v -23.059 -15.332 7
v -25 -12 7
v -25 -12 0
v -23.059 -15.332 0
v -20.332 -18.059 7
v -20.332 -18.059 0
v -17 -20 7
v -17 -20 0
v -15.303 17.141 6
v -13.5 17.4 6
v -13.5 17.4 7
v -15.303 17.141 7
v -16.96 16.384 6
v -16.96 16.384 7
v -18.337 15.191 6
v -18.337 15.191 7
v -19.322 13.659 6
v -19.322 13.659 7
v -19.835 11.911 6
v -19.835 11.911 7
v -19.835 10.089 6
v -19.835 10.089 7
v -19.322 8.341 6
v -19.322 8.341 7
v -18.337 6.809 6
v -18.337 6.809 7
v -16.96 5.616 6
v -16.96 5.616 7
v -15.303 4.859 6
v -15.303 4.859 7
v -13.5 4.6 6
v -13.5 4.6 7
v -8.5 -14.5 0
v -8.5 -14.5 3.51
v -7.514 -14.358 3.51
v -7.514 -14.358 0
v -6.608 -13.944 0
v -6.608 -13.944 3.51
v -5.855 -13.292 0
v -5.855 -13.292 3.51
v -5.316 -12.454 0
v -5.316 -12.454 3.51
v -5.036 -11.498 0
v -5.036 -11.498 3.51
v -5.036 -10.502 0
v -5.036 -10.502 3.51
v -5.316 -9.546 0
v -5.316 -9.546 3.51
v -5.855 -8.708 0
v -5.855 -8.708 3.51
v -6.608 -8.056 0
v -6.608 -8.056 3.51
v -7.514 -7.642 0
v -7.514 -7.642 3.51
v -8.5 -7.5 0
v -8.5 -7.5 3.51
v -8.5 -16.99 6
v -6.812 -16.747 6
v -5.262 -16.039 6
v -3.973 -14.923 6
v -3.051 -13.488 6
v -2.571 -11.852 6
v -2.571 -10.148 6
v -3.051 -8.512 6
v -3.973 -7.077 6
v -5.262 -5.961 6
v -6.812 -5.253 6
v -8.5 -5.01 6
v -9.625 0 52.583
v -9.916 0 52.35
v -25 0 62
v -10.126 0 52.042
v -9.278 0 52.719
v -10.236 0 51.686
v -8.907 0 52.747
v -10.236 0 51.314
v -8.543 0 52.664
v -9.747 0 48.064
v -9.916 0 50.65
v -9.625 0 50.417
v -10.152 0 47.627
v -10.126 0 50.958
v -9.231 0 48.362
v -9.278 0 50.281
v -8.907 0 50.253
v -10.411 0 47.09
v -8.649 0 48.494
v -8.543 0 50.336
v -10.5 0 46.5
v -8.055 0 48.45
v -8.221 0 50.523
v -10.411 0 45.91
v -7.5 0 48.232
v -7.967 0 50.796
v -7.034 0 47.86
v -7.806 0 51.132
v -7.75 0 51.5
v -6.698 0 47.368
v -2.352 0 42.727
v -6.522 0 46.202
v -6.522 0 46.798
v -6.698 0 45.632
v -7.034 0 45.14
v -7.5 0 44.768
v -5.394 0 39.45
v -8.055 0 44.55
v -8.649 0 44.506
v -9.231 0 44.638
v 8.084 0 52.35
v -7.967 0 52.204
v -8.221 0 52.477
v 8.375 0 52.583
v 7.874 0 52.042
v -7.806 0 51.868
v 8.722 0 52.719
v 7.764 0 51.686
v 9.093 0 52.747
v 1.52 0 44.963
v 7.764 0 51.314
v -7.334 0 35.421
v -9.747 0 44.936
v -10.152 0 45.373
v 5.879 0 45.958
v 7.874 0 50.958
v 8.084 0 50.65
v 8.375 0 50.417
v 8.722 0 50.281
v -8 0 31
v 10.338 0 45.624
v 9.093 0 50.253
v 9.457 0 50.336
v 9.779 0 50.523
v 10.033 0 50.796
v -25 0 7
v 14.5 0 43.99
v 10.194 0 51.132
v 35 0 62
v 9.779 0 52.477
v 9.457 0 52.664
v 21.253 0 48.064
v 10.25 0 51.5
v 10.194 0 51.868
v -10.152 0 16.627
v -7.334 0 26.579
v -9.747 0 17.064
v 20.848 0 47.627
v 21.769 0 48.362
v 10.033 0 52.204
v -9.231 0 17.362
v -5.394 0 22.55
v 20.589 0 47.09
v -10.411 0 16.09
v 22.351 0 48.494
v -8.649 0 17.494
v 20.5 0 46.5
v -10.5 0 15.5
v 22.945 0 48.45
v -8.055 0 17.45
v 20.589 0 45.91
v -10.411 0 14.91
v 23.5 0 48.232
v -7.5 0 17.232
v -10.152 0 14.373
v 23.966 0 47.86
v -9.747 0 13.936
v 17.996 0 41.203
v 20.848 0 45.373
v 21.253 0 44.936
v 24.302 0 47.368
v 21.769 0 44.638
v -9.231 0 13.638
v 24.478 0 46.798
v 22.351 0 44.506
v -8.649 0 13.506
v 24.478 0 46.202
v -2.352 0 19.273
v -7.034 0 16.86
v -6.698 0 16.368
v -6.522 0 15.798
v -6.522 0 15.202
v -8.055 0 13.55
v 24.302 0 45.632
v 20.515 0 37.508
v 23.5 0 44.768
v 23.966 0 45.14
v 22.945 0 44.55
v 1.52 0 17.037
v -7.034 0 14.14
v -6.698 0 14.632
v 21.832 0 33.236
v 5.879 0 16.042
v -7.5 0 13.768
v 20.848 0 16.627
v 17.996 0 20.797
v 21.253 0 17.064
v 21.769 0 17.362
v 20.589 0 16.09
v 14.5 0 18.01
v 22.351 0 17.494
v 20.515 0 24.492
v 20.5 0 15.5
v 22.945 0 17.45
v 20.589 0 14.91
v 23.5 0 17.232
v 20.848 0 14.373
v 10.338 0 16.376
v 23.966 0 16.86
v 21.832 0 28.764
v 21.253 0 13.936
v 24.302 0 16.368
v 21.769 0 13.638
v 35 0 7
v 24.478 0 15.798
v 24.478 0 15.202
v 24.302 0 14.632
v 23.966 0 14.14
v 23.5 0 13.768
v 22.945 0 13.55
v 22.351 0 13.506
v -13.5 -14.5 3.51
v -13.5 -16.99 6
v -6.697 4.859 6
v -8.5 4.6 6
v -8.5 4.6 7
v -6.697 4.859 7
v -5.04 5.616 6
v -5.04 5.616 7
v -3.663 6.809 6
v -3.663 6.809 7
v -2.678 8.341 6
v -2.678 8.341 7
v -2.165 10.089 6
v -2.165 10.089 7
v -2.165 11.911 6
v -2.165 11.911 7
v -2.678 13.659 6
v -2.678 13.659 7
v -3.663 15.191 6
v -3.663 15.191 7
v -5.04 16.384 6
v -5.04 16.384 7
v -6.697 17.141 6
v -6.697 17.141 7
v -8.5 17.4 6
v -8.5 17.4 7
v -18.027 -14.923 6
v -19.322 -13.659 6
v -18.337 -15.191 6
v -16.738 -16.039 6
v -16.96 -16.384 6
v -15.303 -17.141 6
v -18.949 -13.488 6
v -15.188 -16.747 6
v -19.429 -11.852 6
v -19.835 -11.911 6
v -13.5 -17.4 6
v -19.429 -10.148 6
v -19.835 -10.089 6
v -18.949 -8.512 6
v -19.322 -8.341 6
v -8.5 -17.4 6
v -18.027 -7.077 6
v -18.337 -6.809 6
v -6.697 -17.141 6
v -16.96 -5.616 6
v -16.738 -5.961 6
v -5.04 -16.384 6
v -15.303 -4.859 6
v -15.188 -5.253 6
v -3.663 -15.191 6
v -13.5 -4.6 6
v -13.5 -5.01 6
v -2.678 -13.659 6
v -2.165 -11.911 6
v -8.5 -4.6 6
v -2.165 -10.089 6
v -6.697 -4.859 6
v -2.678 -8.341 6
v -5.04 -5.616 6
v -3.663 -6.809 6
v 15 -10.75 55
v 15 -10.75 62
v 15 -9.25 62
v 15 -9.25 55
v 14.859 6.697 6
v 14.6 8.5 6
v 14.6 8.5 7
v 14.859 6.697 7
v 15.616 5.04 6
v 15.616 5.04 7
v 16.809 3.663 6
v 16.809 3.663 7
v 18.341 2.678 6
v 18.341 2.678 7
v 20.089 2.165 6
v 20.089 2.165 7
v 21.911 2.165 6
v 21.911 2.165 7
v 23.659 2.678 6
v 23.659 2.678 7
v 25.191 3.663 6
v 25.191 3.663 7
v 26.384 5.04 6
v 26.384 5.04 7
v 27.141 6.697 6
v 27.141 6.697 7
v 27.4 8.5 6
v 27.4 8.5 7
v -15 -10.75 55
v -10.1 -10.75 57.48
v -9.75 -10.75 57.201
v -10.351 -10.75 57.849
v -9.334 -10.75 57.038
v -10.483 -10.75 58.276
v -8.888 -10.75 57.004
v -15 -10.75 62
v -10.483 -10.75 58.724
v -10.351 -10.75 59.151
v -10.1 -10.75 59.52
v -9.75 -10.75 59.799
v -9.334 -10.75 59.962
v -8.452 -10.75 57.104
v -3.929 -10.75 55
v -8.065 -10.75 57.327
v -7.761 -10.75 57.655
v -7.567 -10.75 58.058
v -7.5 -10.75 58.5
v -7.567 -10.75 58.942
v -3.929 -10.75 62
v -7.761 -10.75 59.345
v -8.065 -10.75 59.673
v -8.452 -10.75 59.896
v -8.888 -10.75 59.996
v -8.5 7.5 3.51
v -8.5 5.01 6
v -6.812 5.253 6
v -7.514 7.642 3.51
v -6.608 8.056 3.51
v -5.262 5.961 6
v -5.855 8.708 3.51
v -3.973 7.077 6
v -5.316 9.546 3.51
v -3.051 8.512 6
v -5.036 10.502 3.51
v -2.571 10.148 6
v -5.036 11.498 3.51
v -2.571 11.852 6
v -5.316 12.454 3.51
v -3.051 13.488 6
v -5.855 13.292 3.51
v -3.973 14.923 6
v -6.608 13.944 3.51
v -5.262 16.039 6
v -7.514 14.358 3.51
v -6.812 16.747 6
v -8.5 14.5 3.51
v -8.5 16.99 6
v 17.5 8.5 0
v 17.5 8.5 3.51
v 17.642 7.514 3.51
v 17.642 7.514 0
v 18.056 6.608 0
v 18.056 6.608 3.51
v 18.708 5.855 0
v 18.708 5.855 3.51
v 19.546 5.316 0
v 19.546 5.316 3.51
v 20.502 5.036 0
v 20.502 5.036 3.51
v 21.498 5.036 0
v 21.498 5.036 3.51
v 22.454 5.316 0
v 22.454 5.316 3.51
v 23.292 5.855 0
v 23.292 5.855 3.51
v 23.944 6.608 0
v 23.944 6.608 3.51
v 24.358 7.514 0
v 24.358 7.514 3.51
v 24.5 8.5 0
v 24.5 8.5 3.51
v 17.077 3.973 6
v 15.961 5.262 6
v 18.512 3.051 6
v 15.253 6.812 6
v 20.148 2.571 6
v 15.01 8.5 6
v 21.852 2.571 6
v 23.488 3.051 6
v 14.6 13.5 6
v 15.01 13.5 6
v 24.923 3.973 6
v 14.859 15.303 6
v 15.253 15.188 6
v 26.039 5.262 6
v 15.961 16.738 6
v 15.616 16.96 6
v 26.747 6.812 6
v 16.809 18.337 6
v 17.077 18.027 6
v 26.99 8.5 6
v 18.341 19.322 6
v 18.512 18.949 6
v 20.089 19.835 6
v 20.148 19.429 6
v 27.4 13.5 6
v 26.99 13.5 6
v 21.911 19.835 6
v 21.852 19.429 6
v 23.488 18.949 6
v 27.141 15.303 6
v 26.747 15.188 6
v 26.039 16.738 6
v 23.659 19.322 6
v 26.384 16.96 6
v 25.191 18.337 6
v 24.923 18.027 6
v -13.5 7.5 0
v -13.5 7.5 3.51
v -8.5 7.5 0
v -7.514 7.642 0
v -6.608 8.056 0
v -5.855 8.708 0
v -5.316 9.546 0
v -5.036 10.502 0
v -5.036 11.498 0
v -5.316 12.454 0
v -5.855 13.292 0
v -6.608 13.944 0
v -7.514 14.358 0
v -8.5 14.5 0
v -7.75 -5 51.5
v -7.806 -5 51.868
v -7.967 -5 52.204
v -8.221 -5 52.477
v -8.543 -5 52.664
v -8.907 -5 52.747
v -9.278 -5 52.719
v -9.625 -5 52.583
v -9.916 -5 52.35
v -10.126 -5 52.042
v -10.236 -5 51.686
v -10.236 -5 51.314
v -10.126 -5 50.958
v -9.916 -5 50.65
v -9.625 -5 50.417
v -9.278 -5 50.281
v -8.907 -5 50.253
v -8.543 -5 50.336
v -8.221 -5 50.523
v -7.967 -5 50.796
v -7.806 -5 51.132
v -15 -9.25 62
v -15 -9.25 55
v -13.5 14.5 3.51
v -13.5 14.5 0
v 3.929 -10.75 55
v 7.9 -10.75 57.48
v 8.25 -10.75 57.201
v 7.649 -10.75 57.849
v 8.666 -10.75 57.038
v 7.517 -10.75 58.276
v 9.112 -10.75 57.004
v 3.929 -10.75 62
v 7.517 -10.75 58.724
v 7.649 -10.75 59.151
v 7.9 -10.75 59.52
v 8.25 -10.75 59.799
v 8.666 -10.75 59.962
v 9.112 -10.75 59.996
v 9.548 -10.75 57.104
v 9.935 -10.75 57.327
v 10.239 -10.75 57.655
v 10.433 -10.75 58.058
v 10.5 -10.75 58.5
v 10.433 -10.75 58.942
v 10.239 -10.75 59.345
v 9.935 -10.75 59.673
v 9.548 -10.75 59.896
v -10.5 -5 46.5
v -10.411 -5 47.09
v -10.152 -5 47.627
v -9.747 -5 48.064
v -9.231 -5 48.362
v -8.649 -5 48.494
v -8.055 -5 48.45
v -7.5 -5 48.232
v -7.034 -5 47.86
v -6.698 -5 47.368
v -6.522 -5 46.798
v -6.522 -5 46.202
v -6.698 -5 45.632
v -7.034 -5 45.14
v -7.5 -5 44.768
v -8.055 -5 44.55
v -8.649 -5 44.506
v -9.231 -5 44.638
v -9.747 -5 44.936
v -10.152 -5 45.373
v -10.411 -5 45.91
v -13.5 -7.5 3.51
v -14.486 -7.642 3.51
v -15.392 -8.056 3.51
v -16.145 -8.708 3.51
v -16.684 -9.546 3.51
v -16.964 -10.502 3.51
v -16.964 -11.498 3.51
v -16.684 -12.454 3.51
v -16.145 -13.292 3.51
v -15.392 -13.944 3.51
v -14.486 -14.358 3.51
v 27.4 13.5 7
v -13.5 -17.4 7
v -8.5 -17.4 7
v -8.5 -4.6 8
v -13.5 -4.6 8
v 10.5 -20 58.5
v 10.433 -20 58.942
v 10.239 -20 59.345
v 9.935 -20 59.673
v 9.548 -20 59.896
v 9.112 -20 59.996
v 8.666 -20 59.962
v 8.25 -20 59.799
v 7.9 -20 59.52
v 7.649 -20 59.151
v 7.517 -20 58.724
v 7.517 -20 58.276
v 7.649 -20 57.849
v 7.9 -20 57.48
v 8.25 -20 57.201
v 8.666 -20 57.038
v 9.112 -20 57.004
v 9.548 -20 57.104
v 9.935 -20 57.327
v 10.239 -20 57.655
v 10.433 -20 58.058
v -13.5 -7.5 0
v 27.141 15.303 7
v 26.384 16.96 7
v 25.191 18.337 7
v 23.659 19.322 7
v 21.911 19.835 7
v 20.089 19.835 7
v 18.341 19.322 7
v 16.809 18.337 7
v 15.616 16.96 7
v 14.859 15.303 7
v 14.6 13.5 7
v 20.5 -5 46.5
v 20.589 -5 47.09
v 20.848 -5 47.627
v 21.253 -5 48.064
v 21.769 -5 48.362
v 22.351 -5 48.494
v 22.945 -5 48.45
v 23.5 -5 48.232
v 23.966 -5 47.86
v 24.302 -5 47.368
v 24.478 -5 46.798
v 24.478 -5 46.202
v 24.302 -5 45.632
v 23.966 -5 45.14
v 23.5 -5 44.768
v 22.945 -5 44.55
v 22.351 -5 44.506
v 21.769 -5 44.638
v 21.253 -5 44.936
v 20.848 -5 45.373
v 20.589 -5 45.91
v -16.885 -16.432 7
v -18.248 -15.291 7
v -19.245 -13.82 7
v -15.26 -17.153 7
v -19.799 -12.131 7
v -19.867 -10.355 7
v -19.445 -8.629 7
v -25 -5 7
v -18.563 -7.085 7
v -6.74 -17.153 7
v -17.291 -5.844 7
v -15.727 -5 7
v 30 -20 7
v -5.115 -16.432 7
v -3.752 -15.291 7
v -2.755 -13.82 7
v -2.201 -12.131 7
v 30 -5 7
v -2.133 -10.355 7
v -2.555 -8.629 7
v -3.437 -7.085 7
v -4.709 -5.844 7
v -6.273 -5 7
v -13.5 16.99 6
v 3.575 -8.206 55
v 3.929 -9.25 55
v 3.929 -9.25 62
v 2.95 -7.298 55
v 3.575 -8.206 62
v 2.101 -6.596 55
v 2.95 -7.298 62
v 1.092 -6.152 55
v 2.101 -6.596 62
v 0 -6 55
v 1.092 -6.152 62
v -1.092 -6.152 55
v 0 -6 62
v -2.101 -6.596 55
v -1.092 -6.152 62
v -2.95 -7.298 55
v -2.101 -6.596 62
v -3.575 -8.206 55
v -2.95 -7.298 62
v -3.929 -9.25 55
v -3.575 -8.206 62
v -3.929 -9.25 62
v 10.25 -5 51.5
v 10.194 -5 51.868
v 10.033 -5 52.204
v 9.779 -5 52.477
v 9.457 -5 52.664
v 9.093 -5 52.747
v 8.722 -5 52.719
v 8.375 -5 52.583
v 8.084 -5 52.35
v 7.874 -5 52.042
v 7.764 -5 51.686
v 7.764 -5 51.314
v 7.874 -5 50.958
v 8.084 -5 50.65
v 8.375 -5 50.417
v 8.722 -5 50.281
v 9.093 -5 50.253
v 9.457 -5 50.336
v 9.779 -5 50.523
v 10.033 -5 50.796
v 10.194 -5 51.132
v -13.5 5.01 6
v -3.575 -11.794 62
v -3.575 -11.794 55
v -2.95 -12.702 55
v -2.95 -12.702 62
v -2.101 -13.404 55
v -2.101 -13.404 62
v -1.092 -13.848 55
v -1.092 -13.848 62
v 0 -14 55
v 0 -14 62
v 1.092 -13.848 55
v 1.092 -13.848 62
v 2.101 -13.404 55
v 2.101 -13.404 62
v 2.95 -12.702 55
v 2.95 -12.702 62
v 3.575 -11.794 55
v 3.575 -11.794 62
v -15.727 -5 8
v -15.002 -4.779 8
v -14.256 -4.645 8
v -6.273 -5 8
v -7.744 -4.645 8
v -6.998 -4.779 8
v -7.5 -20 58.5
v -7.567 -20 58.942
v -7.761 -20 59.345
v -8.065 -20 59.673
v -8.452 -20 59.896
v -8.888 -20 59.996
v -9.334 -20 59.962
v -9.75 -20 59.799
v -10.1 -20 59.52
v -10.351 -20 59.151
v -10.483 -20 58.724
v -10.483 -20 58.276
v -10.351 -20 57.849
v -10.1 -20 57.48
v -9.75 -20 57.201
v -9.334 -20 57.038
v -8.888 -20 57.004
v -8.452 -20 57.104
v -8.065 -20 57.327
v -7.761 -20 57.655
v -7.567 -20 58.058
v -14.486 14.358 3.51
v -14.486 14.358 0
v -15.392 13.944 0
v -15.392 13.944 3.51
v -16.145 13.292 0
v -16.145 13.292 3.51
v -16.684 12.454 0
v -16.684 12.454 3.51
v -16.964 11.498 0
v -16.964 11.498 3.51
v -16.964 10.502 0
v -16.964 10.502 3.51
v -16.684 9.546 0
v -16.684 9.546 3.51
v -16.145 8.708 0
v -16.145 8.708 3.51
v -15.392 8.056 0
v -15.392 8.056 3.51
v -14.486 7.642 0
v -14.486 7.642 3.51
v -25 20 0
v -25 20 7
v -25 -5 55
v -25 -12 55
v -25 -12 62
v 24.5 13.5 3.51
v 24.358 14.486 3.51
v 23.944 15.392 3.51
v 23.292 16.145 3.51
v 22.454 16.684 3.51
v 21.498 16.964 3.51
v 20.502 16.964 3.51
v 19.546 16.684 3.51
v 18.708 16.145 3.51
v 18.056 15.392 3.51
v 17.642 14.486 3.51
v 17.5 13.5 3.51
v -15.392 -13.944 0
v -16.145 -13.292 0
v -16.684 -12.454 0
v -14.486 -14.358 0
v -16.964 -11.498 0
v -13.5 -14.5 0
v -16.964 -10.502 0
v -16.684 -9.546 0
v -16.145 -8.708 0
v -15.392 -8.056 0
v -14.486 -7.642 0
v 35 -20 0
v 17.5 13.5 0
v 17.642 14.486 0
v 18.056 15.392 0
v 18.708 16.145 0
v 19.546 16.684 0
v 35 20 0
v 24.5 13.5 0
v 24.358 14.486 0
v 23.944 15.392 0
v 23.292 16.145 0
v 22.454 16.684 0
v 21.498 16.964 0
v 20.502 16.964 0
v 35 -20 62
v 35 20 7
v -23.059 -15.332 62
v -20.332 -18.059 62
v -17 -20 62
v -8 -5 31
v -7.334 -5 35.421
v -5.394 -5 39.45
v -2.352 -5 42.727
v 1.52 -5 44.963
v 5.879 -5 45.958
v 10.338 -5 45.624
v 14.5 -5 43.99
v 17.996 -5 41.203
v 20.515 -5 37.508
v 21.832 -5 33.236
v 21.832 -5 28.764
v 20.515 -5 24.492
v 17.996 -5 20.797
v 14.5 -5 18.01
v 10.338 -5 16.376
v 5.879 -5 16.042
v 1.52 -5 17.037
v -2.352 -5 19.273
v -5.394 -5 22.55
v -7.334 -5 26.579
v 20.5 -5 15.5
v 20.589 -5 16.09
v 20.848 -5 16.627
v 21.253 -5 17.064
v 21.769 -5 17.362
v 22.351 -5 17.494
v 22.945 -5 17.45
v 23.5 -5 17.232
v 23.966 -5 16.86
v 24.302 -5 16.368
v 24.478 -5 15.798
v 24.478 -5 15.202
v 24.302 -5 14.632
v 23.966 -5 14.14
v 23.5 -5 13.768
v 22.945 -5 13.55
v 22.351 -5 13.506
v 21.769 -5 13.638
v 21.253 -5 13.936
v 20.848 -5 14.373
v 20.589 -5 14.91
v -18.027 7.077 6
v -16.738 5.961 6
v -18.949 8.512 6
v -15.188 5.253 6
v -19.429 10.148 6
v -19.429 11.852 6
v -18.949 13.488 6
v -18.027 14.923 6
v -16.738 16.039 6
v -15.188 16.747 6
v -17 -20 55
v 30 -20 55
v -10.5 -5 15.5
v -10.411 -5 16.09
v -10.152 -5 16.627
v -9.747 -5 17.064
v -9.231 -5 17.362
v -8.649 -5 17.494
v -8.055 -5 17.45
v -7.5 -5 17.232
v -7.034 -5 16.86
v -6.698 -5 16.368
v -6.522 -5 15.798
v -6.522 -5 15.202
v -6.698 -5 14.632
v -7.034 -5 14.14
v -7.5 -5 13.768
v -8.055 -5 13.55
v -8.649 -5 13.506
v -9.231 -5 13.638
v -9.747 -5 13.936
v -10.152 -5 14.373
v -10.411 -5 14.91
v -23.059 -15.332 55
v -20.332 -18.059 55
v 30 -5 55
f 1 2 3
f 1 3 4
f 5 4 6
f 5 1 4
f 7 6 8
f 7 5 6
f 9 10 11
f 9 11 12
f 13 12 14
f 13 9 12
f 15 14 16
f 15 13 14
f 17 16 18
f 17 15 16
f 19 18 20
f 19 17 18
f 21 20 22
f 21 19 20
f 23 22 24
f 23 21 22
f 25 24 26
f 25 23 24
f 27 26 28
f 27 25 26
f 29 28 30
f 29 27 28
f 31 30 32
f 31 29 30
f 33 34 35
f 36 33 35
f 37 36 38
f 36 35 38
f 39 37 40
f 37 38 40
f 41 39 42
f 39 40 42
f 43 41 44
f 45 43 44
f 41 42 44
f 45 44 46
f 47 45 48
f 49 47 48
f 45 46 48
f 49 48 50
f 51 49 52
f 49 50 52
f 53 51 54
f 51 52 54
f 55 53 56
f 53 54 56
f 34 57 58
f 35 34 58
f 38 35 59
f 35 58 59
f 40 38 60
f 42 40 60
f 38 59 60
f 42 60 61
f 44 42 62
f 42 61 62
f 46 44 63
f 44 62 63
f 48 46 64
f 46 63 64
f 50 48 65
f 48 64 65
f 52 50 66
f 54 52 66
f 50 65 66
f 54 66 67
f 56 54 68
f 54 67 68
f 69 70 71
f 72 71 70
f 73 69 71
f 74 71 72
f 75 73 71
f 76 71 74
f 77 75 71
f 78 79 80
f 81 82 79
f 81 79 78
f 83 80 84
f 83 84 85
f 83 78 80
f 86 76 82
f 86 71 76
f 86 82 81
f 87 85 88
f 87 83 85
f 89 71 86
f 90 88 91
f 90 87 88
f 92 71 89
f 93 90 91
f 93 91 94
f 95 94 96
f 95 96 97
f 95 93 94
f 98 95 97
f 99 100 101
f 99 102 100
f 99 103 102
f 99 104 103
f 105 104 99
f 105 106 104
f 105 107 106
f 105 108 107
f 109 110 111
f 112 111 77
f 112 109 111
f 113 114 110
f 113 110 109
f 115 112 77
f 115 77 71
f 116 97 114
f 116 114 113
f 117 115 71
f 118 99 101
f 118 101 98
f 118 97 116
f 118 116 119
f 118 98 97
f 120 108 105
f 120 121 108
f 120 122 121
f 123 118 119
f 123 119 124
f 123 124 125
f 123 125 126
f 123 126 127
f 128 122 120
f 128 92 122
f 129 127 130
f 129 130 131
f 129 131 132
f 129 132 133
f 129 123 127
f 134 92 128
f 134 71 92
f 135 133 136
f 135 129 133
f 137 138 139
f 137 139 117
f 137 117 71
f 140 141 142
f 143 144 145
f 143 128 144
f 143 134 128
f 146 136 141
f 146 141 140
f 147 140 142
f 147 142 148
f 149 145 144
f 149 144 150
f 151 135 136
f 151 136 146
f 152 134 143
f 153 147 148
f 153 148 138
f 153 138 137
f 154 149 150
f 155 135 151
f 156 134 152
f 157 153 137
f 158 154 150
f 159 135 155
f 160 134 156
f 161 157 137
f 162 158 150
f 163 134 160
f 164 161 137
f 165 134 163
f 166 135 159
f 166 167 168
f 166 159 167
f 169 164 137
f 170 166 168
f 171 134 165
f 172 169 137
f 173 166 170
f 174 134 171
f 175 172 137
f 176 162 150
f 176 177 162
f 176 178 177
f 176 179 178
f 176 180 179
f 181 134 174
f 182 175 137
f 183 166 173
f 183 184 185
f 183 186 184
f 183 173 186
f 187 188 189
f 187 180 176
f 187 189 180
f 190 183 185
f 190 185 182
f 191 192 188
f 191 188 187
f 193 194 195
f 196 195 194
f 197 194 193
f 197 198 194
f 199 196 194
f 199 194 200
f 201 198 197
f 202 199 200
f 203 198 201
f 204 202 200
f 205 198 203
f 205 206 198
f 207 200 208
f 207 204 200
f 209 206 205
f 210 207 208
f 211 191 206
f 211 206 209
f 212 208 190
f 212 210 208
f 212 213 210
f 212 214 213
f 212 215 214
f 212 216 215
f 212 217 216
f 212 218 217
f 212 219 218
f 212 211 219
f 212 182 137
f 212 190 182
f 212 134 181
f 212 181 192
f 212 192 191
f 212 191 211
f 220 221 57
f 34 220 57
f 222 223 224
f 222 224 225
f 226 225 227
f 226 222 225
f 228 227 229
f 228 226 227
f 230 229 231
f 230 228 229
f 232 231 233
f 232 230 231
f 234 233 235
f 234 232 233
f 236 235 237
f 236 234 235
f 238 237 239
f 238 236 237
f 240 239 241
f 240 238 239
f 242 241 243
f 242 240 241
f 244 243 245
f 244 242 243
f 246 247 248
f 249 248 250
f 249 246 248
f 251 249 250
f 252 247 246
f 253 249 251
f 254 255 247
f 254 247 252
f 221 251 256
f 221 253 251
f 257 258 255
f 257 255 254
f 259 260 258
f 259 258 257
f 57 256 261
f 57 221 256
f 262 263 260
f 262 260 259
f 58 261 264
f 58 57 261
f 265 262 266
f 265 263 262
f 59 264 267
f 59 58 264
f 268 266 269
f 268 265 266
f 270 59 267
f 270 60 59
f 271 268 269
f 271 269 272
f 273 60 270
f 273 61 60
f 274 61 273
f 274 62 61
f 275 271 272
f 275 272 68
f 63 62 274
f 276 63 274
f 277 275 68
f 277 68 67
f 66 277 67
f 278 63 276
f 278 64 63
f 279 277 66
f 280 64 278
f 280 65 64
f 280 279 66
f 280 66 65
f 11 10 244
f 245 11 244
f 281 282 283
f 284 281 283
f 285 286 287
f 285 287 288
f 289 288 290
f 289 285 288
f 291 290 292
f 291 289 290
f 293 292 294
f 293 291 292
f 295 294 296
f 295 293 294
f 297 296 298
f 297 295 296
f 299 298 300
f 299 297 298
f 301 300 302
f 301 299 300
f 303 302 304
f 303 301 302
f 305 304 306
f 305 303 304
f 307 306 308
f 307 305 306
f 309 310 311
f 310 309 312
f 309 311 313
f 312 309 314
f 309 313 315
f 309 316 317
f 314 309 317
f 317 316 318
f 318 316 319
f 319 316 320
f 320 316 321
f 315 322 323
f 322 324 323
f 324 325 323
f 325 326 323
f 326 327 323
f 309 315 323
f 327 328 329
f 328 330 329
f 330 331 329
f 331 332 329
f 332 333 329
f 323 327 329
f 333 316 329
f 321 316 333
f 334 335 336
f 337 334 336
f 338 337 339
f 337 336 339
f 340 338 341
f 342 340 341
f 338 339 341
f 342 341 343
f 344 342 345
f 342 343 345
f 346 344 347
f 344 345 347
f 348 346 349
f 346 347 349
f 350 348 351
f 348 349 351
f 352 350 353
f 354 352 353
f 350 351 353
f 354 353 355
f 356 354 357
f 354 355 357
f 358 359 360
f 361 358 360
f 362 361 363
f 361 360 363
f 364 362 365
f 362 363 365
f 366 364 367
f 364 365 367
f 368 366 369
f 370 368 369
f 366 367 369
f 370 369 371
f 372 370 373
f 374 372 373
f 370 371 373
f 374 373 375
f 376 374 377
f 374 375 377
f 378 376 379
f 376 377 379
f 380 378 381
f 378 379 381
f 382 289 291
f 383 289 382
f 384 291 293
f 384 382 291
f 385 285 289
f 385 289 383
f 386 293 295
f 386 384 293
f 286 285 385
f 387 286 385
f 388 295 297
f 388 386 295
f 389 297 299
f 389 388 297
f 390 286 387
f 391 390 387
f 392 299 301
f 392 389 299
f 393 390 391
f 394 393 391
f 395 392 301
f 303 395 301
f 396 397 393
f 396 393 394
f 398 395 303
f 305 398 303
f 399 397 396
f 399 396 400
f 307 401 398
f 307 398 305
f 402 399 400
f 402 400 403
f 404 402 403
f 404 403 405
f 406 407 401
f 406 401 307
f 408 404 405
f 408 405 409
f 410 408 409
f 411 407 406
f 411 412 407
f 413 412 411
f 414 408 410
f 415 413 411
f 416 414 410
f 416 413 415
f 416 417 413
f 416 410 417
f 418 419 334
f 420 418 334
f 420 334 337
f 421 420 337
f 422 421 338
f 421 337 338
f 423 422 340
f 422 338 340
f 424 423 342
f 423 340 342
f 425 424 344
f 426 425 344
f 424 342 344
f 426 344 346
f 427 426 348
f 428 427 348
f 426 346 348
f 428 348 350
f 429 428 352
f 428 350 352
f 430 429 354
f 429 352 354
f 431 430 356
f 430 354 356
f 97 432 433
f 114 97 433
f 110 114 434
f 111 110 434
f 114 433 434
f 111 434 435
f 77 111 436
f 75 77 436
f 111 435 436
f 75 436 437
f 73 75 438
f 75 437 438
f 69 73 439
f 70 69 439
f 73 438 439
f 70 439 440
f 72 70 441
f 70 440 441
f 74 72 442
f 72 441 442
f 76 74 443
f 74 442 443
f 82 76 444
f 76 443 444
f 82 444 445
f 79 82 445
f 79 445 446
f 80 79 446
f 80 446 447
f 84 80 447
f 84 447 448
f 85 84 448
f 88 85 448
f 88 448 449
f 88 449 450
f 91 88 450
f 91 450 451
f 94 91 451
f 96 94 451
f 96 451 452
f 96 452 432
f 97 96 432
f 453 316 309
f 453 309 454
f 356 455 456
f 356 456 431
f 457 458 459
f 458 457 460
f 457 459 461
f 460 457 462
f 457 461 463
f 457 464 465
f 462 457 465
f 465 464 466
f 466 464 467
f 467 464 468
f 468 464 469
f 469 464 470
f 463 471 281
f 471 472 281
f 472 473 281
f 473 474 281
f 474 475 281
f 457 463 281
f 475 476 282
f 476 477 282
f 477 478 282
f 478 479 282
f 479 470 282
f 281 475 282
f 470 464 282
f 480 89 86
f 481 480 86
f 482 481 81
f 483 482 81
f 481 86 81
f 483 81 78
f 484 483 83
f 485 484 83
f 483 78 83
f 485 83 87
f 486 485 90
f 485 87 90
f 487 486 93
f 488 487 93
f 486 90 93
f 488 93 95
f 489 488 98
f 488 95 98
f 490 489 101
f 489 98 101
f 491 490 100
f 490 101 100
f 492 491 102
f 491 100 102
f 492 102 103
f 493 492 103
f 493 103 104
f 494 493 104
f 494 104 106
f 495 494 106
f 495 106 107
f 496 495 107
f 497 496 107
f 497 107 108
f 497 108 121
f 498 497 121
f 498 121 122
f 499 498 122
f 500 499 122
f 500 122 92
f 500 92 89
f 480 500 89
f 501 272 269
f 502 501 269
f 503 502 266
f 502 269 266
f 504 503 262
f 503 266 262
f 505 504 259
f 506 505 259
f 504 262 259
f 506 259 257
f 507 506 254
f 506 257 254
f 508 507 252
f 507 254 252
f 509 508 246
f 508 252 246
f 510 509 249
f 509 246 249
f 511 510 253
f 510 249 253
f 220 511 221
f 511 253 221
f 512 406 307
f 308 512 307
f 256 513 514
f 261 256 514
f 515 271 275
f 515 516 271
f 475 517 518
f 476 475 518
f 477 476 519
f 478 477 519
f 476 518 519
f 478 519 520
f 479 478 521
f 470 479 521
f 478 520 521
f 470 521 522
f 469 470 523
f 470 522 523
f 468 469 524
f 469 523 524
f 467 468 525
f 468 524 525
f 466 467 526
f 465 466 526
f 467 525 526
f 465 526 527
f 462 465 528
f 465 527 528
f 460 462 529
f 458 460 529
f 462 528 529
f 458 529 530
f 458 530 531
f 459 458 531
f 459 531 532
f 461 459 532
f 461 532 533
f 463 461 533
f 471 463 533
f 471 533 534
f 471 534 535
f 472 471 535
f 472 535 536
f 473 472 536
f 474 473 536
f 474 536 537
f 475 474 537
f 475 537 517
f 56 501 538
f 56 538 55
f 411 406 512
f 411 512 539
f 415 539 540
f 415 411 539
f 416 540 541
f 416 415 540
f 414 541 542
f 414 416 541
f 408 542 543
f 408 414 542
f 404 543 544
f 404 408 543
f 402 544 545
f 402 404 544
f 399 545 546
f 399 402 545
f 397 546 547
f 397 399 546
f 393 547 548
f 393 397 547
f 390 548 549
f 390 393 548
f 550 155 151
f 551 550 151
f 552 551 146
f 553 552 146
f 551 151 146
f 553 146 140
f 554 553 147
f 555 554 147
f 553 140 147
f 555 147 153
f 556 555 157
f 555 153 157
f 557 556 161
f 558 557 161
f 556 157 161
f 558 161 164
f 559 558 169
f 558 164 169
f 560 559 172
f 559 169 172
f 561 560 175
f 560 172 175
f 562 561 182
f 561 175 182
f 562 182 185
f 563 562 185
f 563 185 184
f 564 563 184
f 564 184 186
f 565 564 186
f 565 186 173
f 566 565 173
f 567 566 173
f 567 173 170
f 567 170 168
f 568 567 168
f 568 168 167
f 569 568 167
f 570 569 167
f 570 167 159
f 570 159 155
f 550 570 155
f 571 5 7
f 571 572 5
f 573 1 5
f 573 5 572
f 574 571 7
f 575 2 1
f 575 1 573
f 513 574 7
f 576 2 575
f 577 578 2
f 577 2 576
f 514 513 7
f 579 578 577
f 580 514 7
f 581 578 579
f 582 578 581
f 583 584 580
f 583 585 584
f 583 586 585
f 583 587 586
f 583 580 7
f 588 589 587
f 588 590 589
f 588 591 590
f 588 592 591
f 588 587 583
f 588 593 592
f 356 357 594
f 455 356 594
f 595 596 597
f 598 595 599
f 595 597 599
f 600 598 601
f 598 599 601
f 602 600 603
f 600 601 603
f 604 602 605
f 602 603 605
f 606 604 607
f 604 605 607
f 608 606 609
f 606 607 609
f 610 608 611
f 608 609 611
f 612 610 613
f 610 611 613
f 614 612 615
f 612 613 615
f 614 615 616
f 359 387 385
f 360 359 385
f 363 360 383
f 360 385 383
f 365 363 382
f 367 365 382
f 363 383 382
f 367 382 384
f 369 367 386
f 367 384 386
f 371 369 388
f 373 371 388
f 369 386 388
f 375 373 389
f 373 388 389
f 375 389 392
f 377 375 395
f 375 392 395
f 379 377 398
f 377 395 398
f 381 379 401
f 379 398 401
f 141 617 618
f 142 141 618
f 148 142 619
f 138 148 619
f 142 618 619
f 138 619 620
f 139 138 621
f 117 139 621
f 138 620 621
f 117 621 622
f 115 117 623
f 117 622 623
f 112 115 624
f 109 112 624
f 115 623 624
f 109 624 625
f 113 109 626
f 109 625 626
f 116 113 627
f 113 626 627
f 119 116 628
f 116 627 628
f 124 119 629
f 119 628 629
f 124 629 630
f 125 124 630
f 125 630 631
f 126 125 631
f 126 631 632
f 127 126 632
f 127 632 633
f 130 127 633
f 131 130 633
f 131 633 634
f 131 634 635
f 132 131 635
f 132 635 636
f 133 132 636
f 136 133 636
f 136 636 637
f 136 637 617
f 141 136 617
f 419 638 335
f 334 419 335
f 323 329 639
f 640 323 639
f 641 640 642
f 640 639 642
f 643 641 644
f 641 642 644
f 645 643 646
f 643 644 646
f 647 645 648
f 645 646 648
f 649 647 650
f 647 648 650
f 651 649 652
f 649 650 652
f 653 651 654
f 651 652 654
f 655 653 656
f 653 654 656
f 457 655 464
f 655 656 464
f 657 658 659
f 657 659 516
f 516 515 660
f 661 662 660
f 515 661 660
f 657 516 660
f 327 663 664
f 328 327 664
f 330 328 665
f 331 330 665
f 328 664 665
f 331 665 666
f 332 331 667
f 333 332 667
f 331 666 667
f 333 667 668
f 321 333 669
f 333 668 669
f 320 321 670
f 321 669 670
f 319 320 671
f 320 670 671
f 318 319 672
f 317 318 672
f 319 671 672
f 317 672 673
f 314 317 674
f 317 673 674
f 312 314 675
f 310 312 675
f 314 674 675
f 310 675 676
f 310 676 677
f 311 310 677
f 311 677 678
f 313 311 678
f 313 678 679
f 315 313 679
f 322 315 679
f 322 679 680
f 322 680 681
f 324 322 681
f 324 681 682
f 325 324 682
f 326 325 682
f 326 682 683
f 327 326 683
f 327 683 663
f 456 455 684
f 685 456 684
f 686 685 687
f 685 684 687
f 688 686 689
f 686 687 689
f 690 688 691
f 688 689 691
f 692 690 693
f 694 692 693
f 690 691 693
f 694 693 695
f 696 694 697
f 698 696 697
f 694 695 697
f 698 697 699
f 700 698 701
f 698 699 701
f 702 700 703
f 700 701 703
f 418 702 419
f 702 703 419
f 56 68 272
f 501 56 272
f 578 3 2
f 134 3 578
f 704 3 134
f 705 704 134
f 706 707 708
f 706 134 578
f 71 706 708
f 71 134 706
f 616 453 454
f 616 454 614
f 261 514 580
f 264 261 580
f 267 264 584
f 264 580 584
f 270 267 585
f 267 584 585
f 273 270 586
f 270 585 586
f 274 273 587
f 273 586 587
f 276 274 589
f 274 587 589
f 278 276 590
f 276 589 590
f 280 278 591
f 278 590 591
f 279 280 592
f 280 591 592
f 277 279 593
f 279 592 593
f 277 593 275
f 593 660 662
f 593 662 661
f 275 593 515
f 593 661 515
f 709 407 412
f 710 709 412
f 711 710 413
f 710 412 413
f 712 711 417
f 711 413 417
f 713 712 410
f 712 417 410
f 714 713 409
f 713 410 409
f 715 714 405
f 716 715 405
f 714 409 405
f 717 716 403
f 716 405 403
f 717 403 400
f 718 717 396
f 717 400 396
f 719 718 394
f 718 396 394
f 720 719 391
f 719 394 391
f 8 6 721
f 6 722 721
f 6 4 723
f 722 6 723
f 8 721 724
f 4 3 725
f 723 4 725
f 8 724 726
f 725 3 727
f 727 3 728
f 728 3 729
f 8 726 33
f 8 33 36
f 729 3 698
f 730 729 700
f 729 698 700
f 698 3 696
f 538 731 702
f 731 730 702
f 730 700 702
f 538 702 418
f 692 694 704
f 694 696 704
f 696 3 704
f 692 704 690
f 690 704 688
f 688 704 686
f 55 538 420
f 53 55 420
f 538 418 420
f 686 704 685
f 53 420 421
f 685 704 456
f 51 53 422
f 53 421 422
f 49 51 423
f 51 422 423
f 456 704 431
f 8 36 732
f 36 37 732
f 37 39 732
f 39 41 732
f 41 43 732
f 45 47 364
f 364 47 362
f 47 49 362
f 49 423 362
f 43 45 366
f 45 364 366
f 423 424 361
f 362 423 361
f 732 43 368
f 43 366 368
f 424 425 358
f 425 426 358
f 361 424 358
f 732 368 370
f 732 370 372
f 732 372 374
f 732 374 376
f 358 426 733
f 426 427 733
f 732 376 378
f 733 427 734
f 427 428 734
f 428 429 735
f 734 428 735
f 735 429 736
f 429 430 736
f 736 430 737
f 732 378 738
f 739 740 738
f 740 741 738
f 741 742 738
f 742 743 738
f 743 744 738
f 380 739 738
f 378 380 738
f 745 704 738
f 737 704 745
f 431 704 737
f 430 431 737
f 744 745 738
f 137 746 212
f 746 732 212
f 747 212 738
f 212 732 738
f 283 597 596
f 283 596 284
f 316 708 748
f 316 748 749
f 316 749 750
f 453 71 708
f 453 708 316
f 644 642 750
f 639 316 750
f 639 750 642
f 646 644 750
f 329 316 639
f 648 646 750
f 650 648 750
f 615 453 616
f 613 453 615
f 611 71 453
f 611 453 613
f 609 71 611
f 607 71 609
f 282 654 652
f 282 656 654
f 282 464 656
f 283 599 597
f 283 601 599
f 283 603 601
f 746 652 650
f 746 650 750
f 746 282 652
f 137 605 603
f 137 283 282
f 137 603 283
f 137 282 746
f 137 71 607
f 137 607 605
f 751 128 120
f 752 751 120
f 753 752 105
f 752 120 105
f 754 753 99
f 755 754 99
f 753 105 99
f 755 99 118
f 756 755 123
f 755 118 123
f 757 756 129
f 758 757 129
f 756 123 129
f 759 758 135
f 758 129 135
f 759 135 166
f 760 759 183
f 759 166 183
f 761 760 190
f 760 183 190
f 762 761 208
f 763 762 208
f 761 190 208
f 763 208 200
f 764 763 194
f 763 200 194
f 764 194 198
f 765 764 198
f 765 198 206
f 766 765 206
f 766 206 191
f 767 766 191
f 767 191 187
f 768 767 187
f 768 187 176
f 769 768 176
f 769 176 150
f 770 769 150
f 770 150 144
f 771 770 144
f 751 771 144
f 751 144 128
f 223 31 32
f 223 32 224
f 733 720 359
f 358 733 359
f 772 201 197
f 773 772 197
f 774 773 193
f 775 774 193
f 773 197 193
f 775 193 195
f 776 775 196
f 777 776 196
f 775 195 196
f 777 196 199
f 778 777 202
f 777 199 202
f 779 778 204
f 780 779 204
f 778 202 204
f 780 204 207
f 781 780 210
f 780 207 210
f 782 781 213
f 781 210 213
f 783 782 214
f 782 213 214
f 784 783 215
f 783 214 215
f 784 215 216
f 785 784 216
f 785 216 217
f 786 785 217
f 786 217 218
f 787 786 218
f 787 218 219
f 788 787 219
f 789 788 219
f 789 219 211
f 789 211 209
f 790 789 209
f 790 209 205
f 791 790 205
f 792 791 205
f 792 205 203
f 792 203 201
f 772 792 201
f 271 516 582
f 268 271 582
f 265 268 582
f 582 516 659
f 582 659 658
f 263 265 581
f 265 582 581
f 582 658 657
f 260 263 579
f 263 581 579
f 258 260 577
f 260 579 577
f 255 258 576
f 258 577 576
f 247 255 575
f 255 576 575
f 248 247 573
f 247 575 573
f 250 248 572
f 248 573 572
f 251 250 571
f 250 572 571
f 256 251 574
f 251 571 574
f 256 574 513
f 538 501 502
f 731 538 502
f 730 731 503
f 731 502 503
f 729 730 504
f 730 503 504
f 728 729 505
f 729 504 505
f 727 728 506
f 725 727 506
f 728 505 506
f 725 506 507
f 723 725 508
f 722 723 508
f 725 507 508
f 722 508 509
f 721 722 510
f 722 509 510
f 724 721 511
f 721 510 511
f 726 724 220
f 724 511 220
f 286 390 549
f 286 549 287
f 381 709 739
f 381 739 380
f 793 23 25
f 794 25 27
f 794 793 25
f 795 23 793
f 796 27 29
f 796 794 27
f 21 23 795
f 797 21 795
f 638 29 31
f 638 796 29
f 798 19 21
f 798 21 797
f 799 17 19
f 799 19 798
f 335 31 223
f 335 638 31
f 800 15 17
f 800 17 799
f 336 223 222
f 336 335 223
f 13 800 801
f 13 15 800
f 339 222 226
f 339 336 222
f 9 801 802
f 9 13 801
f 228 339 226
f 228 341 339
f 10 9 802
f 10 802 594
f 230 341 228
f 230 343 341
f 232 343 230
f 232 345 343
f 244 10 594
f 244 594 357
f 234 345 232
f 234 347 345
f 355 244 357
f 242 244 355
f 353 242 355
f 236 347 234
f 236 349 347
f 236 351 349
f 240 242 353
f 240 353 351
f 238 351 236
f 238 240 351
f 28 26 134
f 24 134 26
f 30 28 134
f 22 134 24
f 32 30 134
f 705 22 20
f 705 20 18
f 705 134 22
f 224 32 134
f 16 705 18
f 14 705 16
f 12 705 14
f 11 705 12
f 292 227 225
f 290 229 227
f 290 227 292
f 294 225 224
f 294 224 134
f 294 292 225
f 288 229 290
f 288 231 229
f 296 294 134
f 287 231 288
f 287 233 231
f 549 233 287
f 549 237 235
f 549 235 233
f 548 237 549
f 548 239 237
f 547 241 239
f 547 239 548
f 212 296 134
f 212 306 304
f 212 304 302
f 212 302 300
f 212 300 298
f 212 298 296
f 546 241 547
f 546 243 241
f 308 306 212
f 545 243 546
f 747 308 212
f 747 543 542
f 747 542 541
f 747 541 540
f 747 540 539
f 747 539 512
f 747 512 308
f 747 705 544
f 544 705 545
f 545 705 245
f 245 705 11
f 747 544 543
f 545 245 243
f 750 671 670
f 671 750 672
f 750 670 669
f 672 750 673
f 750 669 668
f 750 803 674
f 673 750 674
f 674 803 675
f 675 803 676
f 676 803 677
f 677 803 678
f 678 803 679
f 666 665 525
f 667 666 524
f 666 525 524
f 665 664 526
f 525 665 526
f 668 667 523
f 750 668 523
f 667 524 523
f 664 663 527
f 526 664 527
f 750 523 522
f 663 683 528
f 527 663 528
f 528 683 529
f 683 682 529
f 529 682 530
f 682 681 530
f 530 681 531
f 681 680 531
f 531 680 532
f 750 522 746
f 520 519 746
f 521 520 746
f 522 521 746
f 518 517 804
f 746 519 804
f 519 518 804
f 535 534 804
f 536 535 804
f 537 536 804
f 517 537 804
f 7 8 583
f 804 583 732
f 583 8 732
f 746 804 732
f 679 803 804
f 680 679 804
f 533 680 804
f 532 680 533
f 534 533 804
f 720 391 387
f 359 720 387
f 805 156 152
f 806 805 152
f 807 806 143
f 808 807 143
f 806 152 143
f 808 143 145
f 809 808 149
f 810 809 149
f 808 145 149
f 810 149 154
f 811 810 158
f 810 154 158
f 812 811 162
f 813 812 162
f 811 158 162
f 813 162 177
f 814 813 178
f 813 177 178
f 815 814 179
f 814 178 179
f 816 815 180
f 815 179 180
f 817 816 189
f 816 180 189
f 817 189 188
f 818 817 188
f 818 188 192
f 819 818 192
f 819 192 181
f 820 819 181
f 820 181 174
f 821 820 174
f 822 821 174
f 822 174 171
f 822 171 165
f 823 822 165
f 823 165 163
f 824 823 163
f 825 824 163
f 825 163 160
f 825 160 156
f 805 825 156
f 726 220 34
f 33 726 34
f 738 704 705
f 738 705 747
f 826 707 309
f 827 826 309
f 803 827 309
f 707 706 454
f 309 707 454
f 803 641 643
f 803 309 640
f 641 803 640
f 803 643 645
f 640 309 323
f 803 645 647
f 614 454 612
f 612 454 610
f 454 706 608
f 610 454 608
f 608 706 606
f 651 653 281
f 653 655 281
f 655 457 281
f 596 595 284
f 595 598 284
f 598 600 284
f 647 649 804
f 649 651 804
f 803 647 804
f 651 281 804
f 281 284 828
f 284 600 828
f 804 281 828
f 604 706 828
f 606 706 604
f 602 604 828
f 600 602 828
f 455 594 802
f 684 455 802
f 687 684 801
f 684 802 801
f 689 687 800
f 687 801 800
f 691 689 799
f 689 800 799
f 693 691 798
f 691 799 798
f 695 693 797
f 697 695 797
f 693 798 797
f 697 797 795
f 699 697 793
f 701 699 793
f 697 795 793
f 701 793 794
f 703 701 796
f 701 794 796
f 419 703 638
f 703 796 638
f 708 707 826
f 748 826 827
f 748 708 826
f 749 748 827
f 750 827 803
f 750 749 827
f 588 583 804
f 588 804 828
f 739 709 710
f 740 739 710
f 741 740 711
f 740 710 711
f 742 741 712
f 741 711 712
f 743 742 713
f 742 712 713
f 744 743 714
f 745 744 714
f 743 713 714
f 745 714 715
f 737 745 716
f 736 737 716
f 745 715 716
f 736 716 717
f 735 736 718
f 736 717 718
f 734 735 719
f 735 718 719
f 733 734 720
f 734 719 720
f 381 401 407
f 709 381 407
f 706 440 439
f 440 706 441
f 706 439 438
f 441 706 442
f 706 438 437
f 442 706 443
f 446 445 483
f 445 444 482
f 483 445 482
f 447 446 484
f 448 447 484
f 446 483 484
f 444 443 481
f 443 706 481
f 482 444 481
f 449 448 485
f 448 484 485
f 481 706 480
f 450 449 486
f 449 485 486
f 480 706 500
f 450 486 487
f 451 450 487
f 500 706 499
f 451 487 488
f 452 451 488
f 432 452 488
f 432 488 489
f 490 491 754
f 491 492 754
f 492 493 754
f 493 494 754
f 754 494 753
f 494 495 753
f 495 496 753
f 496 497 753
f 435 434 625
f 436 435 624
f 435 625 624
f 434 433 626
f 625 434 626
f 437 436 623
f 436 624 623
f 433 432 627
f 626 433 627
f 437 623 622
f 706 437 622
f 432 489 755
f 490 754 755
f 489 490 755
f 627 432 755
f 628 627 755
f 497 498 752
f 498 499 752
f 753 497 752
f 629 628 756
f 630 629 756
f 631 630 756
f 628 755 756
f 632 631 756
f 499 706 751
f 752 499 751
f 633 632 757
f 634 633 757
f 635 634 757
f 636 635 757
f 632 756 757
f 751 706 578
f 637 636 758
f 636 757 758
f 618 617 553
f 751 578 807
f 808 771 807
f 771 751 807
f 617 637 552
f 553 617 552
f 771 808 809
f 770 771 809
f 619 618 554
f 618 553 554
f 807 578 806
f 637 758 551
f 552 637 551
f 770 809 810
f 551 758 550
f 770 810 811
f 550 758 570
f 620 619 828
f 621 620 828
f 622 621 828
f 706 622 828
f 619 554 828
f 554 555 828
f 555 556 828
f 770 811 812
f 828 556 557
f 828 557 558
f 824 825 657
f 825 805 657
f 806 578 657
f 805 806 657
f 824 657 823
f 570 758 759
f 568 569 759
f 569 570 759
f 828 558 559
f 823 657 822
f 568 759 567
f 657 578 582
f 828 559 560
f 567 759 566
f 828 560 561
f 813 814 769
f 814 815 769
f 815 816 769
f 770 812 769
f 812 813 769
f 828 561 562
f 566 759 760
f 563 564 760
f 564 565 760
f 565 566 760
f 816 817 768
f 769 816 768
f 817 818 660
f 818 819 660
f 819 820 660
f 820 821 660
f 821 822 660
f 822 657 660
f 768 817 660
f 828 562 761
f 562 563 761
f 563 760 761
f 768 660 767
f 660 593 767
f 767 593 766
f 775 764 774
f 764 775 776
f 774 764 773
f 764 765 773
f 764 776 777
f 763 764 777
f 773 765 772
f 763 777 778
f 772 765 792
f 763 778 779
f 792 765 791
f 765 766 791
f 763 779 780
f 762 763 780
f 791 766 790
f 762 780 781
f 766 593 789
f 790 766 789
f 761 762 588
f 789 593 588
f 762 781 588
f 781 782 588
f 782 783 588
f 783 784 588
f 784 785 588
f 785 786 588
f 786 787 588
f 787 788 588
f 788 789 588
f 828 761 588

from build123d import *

# Parameters (mm, degrees)
SKETCH_W             = 60
SKETCH_H             = 40
PAD_DEPTH            = 7
SKETCH001_R          = 3.5
POCKET_DEPTH         = 0.001
POCKET_DEPTH_BACK    = 7.001
SKETCH002_W          = 60
SKETCH002_H          = 5
PAD001_DEPTH         = 55
SKETCH003_W          = 60
SKETCH003_H          = 7
PAD002_DEPTH         = 15
SKETCH004_R          = 4
POCKET001_DEPTH      = 10
SKETCH005_R          = 15
POCKET002_DEPTH      = 10
SKETCH006_R          = 2
POCKET003_DEPTH      = 20.001
POCKET004_DEPTH      = 15
POCKET005_DEPTH      = 1
CHAMFER_SIZE         = 2.49
SKETCH009_W          = 5
SKETCH009_H          = 15
PAD003_DEPTH         = 48
POCKET006_DEPTH      = 62.001
POCKET006_DEPTH_BACK = 0.001
SKETCH011_W          = 30
SKETCH011_H          = 1.5
POCKET007_DEPTH      = 10
SKETCH013_R          = 1.25
POCKET008_DEPTH      = 40.001
SKETCH014_R          = 1.5
POCKET009_DEPTH      = 9.5


with BuildPart() as part:
    # Sketch → Pad (new body)
    with BuildSketch(Plane.XY):
        with Locations((5, 0)):
            Rectangle(SKETCH_W, SKETCH_H)
    extrude(amount=PAD_DEPTH)

    # Sketch001 → Pocket (cut, two sides)
    with BuildSketch(Plane.XY) as pocket_sk:
        with Locations((-11, 11)):
            Circle(SKETCH001_R)
        with Locations((-11, -11)):
            Circle(SKETCH001_R)
        with Locations((21, 11)):
            Circle(SKETCH001_R)
    extrude(amount=-POCKET_DEPTH, mode=Mode.SUBTRACT)
    extrude(pocket_sk.sketch, amount=POCKET_DEPTH_BACK, mode=Mode.SUBTRACT)

    # Sketch002 (on Face5 of Pocket) → Pad001 (join)
    with BuildSketch(Plane.XY.offset(7)):
        with Locations((5, -2.5)):
            Rectangle(SKETCH002_W, SKETCH002_H)
    extrude(amount=PAD001_DEPTH)

    # Sketch003 (on Face14 of Pad001) → Pad002 (join)
    with BuildSketch(Plane.XZ.offset(5)):
        with Locations((5, 58.5)):
            Rectangle(SKETCH003_W, SKETCH003_H)
    extrude(amount=PAD002_DEPTH)

    # Sketch004 (on Face20 of Pad002) → Pocket001 (cut)
    with BuildSketch(Plane.XY.offset(62)):
        with Locations((0, -10)):
            Circle(SKETCH004_R)
    extrude(amount=-POCKET001_DEPTH, mode=Mode.SUBTRACT)

    # Sketch005 (on Face13 of Pocket001) → Pocket002 (cut)
    with BuildSketch(Plane(origin=(0, 0, 0), x_dir=(-1, 0, 0), z_dir=(0, 1, 0))):
        with Locations((-7, 31)):
            Circle(SKETCH005_R)
    extrude(amount=-POCKET002_DEPTH, mode=Mode.SUBTRACT)

    # Sketch006 (on Face13 of Pocket002) → Pocket003 (cut, through all)
    with BuildSketch(Plane(origin=(0, 0, 0), x_dir=(-1, 0, 0), z_dir=(0, 1, 0))):
        with Locations((-22.5, 46.5)):
            Circle(SKETCH006_R)
        with Locations((8.5, 46.5)):
            Circle(SKETCH006_R)
        with Locations((-22.5, 15.5)):
            Circle(SKETCH006_R)
        with Locations((8.5, 15.5)):
            Circle(SKETCH006_R)
    extrude(amount=-POCKET003_DEPTH, mode=Mode.SUBTRACT)

    # Sketch007 (on Face5 of Pocket003) → Pocket004 (cut)
    with BuildSketch(Plane.XY.offset(7)):
        with BuildLine():
            ThreePointArc((-13.5, 14.5), (-17, 11), (-13.5, 7.5))
            Line((-13.5, 7.5), (-8.5, 7.5))
            ThreePointArc((-8.5, 7.5), (-5, 11), (-8.5, 14.5))
            Line((-13.5, 14.5), (-8.5, 14.5))
        make_face()
        with BuildLine():
            ThreePointArc((-13.5, -7.5), (-17, -11), (-13.5, -14.5))
            Line((-13.5, -14.5), (-8.5, -14.5))
            ThreePointArc((-8.5, -14.5), (-5, -11), (-8.5, -7.5))
            Line((-13.5, -7.5), (-8.5, -7.5))
        make_face()
        with BuildLine():
            ThreePointArc((24.5, 13.5), (21, 17), (17.5, 13.5))
            Line((17.5, 13.5), (17.5, 8.5))
            ThreePointArc((17.5, 8.5), (21, 5), (24.5, 8.5))
            Line((24.5, 13.5), (24.5, 8.5))
        make_face()
    extrude(amount=-POCKET004_DEPTH, mode=Mode.SUBTRACT)

    # Sketch008 (on Face5 of Pocket004) → Pocket005 (cut, symmetric)
    with BuildSketch(Plane.XY.offset(7)):
        with BuildLine():
            ThreePointArc((27.4, 13.5), (21, 19.9), (14.6, 13.5))
            Line((14.6, 13.5), (14.6, 8.5))
            ThreePointArc((14.6, 8.5), (21, 2.1), (27.4, 8.5))
            Line((27.4, 13.5), (27.4, 8.5))
        make_face()
        with BuildLine():
            ThreePointArc((-13.5, 17.4), (-19.9, 11), (-13.5, 4.6))
            Line((-13.5, 4.6), (-8.5, 4.6))
            ThreePointArc((-8.5, 4.6), (-2.1, 11), (-8.5, 17.4))
            Line((-13.5, 17.4), (-8.5, 17.4))
        make_face()
        with BuildLine():
            ThreePointArc((-13.5, -4.6), (-19.9, -11), (-13.5, -17.4))
            Line((-13.5, -17.4), (-8.5, -17.4))
            ThreePointArc((-8.5, -17.4), (-2.1, -11), (-8.5, -4.6))
            Line((-13.5, -4.6), (-8.5, -4.6))
        make_face()
    extrude(amount=POCKET005_DEPTH, both=True, mode=Mode.SUBTRACT)

    # Chamfer
    chamfer_edges = [part.edges().sort_by_distance(p)[0] for p in [
        (-17, 11, 6),
        (21, 5, 6),
        (-17, -11, 6),
    ]]
    chamfer(chamfer_edges, length=CHAMFER_SIZE)

    # Sketch009 (on Face37 of Chamfer) → Pad003 (join)
    with BuildSketch(Plane.XY.offset(7)):
        with Locations((32.5, -12.5)):
            Rectangle(SKETCH009_W, SKETCH009_H)
    extrude(amount=PAD003_DEPTH)

    # Sketch010 (on Face76 of Pad003) → Pocket006 (cut, two sides)
    with BuildSketch(Plane.XY.offset(62)) as pocket006_sk:
        with BuildLine():
            Line((-25, -20), (-25, -12))
            ThreePointArc((-25, -12), (-21.78316, -16.78316), (-17, -20))
            Line((-25, -20), (-17, -20))
        make_face()
    extrude(amount=-POCKET006_DEPTH, mode=Mode.SUBTRACT)
    extrude(pocket006_sk.sketch, amount=POCKET006_DEPTH_BACK, mode=Mode.SUBTRACT)

    # Sketch011 (on Face78 of Pocket006) → Pocket007 (cut)
    with BuildSketch(Plane.XY.offset(62)):
        with Locations((0, -10)):
            Rectangle(SKETCH011_W, SKETCH011_H)
    extrude(amount=-POCKET007_DEPTH, mode=Mode.SUBTRACT)

    # Sketch013 (on Face66 of Pocket007) → Pocket008 (cut, through all)
    with BuildSketch(Plane.XZ.offset(20)):
        with Locations((9, 51.5)):
            Circle(SKETCH013_R)
        with Locations((-9, 51.5)):
            Circle(SKETCH013_R)
    extrude(amount=-POCKET008_DEPTH, mode=Mode.SUBTRACT)

    # Sketch014 (on Face66 of Pocket008) → Pocket009 (cut)
    with BuildSketch(Plane.XZ.offset(20)):
        with Locations((-9, 58.5)):
            Circle(SKETCH014_R)
        with Locations((9, 58.5)):
            Circle(SKETCH014_R)
    extrude(amount=-POCKET009_DEPTH, mode=Mode.SUBTRACT)


solid = part.part
